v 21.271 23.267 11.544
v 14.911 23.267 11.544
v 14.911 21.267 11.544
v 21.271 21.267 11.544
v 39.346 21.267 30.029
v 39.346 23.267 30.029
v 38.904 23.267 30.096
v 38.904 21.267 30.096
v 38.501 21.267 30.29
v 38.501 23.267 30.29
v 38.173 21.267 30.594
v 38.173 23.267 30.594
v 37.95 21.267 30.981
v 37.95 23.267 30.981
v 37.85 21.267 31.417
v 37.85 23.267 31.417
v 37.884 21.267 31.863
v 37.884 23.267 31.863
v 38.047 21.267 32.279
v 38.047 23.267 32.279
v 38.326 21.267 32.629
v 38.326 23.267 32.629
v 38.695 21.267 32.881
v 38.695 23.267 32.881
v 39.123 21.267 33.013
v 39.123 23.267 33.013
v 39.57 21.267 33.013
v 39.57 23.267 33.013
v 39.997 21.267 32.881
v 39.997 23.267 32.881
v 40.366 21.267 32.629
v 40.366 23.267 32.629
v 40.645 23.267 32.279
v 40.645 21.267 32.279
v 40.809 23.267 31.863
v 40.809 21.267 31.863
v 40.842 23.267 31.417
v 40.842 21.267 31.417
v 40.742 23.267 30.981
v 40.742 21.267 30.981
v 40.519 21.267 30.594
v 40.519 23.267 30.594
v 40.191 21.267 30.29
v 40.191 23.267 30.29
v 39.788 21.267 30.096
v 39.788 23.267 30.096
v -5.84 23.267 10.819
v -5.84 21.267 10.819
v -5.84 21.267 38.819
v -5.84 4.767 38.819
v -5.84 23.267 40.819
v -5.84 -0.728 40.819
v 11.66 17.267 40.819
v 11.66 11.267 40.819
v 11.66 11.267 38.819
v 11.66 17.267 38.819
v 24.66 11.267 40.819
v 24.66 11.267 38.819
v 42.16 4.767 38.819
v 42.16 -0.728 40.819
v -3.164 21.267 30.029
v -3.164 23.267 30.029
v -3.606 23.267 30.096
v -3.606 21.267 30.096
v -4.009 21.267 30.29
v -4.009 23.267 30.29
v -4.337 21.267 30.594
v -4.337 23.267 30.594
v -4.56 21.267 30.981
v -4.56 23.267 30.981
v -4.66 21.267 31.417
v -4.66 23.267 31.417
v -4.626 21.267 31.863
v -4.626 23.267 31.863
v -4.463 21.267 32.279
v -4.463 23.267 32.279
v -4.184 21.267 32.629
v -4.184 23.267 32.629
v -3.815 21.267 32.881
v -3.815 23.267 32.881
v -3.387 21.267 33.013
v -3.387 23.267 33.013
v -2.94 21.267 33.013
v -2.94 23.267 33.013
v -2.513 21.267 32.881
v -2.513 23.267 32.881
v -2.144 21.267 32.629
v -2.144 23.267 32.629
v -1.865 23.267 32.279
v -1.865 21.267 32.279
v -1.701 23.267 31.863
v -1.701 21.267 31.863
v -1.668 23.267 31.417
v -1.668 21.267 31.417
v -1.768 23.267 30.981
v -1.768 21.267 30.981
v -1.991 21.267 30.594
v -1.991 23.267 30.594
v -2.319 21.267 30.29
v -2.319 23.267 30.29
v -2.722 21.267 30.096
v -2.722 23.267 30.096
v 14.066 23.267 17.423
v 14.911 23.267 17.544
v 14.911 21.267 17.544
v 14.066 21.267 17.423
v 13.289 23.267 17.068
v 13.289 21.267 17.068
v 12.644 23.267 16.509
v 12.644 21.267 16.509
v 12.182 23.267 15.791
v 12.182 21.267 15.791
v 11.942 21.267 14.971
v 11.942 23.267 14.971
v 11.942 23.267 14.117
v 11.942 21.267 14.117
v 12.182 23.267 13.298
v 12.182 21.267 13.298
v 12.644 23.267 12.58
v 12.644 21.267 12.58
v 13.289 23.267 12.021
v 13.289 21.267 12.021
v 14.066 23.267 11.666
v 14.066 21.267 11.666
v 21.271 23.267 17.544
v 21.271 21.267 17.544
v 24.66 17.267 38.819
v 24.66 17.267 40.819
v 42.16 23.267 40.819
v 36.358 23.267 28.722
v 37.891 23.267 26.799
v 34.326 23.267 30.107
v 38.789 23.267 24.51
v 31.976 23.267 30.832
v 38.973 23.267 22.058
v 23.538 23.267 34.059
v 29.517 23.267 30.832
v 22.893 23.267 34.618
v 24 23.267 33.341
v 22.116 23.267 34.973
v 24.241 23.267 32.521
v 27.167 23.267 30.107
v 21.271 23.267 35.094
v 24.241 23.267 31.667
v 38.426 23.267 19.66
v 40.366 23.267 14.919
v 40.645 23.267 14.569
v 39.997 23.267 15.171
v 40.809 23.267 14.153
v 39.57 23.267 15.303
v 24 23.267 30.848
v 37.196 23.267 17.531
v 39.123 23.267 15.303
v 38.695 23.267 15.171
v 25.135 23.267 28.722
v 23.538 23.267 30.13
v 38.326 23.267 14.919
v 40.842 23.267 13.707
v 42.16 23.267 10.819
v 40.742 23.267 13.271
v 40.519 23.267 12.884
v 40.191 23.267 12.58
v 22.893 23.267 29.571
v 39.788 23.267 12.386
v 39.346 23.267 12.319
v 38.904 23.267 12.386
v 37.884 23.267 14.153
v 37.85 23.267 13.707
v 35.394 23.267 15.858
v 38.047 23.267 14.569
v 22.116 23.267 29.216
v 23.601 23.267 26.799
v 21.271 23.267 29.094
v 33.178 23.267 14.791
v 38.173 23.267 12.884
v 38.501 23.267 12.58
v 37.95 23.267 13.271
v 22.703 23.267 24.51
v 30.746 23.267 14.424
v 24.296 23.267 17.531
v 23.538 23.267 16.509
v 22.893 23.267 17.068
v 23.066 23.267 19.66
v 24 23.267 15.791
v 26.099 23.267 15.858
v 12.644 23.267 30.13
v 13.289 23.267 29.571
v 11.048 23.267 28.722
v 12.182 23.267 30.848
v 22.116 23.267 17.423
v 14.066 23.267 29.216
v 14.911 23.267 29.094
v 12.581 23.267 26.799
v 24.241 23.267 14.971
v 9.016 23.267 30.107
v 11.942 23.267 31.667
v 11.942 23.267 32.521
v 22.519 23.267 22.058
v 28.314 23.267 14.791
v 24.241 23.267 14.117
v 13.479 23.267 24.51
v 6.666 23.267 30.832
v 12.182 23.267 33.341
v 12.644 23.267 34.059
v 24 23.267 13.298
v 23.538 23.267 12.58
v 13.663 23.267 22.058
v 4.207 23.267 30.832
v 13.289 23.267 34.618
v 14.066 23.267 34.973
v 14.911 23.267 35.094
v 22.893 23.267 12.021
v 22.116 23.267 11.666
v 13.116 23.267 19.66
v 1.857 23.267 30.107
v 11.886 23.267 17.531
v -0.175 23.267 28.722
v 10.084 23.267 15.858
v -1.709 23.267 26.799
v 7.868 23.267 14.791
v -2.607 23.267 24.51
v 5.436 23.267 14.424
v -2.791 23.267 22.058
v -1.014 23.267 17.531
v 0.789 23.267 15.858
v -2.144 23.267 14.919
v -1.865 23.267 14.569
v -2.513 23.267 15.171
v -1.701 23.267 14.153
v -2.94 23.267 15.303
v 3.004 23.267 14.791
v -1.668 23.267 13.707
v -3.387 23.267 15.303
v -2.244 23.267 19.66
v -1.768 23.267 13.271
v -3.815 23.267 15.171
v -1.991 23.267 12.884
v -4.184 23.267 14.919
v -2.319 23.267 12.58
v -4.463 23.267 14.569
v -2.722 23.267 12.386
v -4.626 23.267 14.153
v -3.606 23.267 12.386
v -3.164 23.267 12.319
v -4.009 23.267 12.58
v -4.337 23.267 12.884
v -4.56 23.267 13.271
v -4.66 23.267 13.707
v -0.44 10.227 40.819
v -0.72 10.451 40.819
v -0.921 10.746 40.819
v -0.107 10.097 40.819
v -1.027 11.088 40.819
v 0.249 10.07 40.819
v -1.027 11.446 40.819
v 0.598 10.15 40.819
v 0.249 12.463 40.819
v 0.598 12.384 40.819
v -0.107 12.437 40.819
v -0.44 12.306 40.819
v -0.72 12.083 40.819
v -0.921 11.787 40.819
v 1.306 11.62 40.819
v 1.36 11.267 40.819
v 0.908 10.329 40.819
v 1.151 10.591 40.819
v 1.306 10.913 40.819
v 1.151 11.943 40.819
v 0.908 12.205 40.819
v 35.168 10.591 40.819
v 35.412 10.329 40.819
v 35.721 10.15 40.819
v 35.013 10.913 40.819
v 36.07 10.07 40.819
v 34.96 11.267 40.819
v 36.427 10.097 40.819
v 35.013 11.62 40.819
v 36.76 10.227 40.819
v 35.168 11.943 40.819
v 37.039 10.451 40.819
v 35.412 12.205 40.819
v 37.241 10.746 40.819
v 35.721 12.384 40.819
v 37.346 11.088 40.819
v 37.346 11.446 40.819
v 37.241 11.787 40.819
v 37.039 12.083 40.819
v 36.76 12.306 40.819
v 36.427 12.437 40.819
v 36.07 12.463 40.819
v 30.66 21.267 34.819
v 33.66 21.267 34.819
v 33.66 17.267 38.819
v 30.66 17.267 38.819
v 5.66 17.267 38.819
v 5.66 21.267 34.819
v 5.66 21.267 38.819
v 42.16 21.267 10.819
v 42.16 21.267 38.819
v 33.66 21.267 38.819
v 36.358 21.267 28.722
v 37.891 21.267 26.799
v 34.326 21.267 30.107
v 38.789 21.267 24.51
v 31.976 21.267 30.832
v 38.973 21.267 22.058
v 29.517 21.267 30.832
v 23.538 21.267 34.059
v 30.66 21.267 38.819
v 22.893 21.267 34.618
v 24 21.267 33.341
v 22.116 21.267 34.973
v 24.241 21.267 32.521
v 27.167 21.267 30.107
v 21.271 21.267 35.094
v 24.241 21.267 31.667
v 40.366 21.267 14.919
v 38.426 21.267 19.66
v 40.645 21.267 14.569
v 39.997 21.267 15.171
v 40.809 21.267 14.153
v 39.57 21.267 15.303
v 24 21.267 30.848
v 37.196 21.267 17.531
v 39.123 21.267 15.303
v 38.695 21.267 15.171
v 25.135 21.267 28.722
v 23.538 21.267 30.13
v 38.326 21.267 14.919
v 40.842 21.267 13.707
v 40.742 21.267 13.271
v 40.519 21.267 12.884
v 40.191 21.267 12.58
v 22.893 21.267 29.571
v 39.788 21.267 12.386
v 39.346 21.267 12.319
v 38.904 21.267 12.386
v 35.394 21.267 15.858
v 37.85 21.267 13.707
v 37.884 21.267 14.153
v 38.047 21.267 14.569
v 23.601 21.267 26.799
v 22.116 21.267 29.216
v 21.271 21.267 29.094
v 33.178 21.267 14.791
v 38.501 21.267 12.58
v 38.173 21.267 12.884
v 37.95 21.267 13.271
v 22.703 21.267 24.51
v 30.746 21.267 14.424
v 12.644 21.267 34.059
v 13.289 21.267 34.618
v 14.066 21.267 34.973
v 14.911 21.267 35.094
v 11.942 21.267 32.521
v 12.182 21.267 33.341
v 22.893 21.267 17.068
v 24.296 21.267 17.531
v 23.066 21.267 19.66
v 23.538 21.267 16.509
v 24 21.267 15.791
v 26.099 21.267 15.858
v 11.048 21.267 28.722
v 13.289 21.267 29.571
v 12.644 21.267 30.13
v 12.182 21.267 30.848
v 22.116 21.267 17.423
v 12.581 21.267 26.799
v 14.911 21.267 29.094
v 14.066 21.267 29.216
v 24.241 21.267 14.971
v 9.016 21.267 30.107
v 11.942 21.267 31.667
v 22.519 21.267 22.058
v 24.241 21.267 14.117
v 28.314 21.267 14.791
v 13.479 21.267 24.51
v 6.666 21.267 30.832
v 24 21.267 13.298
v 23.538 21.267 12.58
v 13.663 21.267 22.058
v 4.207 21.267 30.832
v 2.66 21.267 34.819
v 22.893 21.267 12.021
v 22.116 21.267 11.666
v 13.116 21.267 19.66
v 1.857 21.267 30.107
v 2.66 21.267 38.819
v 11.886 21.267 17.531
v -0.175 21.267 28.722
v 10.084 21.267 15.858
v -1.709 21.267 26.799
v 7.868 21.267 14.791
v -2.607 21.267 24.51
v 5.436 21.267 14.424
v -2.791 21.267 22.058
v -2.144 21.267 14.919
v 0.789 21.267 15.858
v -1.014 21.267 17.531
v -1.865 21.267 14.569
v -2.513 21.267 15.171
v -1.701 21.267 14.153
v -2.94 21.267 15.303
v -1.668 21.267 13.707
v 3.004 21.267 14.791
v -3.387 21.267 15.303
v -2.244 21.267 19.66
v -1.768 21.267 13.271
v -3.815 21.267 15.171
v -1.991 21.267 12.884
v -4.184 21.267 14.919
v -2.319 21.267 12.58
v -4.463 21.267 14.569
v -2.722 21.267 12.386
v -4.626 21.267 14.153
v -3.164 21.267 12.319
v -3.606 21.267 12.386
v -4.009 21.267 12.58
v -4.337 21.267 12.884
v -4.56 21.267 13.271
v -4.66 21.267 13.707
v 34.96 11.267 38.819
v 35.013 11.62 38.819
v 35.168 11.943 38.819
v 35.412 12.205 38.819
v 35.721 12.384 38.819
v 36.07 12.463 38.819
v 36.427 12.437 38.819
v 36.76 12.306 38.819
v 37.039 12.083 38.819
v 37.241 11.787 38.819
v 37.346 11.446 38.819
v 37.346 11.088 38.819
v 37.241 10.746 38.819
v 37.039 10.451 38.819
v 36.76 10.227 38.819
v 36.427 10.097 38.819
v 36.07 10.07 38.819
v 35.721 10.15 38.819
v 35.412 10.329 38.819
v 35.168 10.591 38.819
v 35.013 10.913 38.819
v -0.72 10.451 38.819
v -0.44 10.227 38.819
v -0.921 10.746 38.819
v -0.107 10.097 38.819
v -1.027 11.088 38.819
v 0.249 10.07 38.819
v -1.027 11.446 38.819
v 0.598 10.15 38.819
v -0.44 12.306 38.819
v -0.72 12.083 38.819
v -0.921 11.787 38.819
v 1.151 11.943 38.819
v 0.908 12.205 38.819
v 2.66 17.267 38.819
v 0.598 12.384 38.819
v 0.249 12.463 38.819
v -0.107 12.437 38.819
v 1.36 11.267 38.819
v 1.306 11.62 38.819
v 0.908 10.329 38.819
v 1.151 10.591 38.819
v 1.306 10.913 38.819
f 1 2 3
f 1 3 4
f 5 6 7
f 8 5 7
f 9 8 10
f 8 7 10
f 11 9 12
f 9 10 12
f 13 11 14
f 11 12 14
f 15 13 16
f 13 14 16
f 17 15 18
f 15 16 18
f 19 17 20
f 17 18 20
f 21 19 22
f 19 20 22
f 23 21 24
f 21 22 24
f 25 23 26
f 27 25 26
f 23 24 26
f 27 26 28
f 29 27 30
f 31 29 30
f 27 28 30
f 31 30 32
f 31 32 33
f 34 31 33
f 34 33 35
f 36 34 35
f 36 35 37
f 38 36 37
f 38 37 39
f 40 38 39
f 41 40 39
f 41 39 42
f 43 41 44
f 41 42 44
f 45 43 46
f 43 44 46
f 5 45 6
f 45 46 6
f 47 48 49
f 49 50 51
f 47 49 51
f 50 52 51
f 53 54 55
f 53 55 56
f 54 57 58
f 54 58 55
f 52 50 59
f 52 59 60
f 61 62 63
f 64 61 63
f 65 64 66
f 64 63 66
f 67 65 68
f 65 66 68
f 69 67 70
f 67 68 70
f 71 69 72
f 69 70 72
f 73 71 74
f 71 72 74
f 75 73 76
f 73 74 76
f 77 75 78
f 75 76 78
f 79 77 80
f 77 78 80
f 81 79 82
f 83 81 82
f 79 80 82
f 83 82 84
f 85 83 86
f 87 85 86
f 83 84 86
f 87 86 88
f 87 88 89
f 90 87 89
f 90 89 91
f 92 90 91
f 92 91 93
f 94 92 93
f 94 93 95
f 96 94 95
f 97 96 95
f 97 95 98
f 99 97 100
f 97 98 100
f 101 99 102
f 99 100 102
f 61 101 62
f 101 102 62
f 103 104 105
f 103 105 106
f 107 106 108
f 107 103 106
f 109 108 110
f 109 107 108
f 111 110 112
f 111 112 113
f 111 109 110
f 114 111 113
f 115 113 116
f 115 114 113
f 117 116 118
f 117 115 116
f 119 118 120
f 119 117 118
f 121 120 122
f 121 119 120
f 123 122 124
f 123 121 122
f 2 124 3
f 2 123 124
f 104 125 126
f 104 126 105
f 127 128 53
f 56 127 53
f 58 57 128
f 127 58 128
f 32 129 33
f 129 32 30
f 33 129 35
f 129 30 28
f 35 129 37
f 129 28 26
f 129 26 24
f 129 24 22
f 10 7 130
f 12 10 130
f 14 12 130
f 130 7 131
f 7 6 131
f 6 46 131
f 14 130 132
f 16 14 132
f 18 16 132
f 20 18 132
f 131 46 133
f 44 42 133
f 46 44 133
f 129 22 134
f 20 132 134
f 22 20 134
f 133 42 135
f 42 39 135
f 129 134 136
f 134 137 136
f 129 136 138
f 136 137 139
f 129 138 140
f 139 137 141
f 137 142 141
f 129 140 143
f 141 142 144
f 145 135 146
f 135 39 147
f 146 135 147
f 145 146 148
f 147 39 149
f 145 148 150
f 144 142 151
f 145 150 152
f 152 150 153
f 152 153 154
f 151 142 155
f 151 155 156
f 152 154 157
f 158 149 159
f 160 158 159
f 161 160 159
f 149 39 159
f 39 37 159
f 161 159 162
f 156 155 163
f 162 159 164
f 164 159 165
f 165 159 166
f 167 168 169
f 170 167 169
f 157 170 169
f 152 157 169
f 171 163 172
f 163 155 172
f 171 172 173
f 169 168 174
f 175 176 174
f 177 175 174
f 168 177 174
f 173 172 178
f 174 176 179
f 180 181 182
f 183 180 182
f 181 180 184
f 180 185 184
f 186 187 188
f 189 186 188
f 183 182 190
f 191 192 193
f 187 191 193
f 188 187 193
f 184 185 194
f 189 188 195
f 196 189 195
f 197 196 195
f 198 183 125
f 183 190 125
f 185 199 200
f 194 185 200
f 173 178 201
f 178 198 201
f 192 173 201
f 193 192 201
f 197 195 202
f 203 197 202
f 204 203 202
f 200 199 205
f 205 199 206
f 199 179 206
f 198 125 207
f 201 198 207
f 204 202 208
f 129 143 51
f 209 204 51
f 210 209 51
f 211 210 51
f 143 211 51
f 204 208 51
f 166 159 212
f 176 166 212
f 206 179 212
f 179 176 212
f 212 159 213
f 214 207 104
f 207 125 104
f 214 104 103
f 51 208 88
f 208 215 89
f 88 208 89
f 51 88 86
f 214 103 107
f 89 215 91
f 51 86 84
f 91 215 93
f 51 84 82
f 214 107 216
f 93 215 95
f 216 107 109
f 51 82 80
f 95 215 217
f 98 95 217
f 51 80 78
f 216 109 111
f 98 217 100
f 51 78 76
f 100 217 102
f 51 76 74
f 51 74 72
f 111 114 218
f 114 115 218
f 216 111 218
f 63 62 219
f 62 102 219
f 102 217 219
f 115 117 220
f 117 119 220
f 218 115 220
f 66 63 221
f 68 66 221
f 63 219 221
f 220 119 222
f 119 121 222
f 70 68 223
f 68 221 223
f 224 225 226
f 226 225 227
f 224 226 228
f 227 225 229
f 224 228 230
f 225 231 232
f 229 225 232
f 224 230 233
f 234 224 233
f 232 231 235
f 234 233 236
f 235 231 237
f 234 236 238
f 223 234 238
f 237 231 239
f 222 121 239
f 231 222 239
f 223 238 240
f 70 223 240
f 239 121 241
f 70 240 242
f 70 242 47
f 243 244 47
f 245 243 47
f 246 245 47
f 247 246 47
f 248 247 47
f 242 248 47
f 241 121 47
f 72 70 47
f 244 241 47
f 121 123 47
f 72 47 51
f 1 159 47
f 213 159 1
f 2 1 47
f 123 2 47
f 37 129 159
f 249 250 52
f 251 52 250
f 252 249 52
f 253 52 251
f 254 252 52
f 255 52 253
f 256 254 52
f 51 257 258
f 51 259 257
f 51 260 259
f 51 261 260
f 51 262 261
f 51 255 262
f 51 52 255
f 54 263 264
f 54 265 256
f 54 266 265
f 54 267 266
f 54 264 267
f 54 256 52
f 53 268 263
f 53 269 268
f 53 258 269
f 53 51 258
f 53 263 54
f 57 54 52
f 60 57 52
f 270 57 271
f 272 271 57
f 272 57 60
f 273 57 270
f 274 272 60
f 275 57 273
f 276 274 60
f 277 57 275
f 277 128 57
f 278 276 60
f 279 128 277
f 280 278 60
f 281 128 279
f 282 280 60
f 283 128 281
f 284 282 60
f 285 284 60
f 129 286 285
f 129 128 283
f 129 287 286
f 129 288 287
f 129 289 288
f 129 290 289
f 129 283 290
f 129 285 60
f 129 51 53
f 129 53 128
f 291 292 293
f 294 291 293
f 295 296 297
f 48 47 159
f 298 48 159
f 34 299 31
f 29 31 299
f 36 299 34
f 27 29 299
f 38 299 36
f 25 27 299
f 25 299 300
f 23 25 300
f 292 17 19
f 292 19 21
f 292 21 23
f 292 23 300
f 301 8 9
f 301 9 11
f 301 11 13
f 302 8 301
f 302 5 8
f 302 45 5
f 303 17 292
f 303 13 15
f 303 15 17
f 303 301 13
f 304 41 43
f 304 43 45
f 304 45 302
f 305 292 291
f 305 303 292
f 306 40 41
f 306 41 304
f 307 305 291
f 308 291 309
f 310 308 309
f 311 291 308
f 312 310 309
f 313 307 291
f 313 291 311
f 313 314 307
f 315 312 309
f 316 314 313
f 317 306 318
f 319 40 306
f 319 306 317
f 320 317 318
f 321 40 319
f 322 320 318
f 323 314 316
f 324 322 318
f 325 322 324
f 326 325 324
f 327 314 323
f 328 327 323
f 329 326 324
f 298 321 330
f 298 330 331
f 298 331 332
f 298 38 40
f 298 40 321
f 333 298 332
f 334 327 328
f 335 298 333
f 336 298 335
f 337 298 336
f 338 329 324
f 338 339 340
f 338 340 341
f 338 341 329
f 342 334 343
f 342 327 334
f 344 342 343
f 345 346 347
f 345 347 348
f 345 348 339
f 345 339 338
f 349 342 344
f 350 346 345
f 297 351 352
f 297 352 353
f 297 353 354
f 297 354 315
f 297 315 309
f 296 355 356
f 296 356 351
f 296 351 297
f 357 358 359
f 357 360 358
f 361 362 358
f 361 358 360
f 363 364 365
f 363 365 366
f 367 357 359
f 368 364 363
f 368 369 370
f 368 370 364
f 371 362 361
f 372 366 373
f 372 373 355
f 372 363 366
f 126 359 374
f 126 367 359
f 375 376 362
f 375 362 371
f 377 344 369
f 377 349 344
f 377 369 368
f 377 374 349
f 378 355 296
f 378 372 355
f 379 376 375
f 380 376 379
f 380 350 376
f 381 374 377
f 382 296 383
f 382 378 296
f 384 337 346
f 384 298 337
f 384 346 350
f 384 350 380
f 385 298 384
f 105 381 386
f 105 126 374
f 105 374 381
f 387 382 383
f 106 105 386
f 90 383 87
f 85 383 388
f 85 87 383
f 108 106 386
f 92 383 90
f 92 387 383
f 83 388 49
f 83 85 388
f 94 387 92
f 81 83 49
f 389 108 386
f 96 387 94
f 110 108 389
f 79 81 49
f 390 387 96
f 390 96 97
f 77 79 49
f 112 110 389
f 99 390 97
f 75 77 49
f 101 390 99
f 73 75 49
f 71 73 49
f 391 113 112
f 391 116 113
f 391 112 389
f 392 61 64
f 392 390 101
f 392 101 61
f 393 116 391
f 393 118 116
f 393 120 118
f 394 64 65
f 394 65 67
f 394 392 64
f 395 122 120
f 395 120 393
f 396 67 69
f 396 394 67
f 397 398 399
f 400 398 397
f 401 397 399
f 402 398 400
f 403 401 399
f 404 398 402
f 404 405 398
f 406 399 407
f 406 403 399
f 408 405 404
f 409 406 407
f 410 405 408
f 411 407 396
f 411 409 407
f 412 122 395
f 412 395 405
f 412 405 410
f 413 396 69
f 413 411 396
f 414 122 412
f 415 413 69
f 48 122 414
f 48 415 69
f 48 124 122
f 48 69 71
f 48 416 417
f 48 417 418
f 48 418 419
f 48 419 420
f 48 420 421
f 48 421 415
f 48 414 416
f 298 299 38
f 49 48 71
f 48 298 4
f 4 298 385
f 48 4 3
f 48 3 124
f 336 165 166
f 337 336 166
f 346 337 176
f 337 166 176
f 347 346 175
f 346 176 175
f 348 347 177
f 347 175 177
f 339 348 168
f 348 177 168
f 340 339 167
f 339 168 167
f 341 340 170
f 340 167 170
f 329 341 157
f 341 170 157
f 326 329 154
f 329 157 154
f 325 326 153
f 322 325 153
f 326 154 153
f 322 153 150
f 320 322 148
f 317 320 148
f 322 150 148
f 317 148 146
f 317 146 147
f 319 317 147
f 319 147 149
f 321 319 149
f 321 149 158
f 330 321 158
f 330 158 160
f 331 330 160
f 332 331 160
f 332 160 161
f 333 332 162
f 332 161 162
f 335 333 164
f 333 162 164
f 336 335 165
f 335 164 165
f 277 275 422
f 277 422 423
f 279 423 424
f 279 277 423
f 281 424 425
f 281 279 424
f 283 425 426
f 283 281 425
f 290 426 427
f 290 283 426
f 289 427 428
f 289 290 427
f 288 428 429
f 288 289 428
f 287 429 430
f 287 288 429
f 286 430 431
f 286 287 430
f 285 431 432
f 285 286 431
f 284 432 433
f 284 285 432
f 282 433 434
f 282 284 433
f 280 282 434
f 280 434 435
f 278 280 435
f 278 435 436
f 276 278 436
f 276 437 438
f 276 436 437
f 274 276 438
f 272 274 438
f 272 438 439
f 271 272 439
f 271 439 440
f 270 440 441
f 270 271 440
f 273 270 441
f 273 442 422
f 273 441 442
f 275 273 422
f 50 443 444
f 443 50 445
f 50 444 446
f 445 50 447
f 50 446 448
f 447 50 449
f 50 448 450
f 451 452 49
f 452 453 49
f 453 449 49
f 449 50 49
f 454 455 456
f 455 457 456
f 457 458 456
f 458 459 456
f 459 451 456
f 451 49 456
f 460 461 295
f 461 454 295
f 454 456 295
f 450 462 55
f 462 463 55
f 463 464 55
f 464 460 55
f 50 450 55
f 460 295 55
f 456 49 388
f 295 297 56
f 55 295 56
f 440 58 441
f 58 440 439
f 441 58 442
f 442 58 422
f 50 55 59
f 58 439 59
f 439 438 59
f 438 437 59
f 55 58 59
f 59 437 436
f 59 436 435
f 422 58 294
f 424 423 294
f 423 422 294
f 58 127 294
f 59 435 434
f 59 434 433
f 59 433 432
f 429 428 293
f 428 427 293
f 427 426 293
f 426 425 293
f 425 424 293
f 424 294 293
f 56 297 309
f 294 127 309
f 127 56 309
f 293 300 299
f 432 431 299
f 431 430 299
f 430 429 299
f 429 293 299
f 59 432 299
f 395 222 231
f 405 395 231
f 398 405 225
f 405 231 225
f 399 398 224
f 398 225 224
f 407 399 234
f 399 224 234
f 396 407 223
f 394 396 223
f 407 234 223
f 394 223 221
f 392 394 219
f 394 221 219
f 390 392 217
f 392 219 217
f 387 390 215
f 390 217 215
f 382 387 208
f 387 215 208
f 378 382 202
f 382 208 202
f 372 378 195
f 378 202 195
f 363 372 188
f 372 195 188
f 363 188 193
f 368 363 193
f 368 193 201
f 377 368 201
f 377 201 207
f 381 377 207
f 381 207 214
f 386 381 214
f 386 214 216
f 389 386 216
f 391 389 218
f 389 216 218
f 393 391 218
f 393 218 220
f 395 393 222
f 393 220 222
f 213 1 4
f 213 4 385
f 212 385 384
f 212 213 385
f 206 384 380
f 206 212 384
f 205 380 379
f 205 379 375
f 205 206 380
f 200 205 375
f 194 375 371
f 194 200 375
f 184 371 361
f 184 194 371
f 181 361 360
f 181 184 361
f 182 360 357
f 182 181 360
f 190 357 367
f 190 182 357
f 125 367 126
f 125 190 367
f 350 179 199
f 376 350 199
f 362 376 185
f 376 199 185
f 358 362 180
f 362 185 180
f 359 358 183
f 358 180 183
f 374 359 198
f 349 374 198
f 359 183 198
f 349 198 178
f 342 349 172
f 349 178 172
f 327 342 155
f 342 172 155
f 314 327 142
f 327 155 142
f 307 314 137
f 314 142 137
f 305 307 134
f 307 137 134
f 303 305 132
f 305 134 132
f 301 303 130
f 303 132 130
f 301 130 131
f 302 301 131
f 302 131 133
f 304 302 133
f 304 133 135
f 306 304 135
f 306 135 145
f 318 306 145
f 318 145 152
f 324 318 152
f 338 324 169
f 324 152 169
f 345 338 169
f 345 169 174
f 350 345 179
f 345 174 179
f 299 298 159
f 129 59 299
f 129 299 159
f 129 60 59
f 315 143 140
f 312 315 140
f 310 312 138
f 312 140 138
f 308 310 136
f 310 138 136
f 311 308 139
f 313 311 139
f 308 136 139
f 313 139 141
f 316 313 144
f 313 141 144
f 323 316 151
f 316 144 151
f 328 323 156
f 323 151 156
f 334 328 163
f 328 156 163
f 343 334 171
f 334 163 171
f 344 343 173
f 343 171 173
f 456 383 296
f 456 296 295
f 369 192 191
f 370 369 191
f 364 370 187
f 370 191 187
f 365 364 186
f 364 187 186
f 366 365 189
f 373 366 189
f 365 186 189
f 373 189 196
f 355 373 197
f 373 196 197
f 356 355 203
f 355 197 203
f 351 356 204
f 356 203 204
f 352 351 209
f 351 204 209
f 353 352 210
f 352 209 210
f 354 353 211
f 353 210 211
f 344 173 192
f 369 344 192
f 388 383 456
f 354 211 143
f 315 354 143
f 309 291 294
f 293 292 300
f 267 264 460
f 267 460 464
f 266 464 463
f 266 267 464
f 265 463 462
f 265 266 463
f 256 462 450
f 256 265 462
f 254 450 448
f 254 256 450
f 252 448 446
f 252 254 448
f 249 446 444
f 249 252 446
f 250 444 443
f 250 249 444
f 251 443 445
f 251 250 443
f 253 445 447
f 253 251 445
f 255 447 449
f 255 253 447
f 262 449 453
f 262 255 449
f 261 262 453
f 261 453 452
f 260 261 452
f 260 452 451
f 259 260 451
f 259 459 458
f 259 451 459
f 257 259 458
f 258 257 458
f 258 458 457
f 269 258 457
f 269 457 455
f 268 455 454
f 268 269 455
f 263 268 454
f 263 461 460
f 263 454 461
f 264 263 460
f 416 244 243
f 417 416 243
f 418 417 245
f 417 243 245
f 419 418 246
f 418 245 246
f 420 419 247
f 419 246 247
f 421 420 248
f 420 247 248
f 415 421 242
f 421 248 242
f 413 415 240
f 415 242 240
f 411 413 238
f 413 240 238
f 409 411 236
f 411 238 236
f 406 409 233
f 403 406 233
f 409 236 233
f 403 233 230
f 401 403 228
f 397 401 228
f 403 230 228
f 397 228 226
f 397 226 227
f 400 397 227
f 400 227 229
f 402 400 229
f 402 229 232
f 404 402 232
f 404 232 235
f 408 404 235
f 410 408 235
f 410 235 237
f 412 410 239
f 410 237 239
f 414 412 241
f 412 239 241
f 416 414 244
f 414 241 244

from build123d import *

# Parameters (mm, degrees)
SKIZZE1_W                            = 48
SKIZZE1_H                            = 25
SKIZZE1_R                            = 8.25
SKIZZE1_R_2                          = 1.5
AUFSATZ_LINEAR_AUSTRAGEN1_DEPTH      = 2
SKIZZE2_W                            = 48
SKIZZE2_H                            = 5
AUFSATZ_LINEAR_AUSTRAGEN2_DEPTH      = 2
SKIZZE3_W                            = 48
SKIZZE3_H                            = 22
AUFSATZ_LINEAR_AUSTRAGEN3_DEPTH      = 2
AUFSATZ_LINEAR_AUSTRAGEN4_DEPTH      = 1.5
SCHNITT_LINEAR_AUSTRAGEN1_DEPTH      = 56.702642494
SCHNITT_LINEAR_AUSTRAGEN1_DEPTH_BACK = 56.702642494
SKIZZE6_W                            = 13
SKIZZE6_H                            = 6
SCHNITT_LINEAR_AUSTRAGEN2_DEPTH      = 56.702642494
SCHNITT_LINEAR_AUSTRAGEN2_DEPTH_BACK = 56.702642494
SKIZZE7_R                            = 1.2
FASE1_SIZE                           = 5.5
FASE1_SIZE_2                         = 2.001836288


with BuildPart() as part:
    # Skizze1 → Aufsatz-Linear austragen1 (new body)
    with BuildSketch(Plane(origin=(0, 23.26672716, 0), x_dir=(1, 0, 0), z_dir=(0, 1, 0))):
        with Locations((18.159741318, -23.319374593)):
            Rectangle(SKIZZE1_W, SKIZZE1_H)
        with Locations(Location((5.436155106, -22.674374593, 0), (0, 0, 90))):
            Circle(SKIZZE1_R, mode=Mode.SUBTRACT)
        with Locations(Location((30.746155106, -22.674374593, 0), (0, 0, 90))):
            Circle(SKIZZE1_R, mode=Mode.SUBTRACT)
        with Locations(Location((39.346155106, -31.529374593, 0), (0, 0, 90))):
            Circle(SKIZZE1_R_2, mode=Mode.SUBTRACT)
        with Locations(Location((39.346155106, -13.819374593, 0), (0, 0, 90))):
            Circle(SKIZZE1_R_2, mode=Mode.SUBTRACT)
        with Locations(Location((-3.163844894, -13.819374593, 0), (0, 0, 90))):
            Circle(SKIZZE1_R_2, mode=Mode.SUBTRACT)
        with Locations(Location((-3.163844894, -31.529374593, 0), (0, 0, 90))):
            Circle(SKIZZE1_R_2, mode=Mode.SUBTRACT)
        with BuildLine():
            Line((21.271155106, -29.094374598), (14.911155106, -29.094374598))
            ThreePointArc((14.911155106, -29.094374598), (11.911155106, -32.094374598), (14.911155106, -35.094374598))
            Line((14.911155106, -35.094374598), (21.271155106, -35.094374598))
            ThreePointArc((21.271155106, -35.094374598), (24.271155106, -32.094374598), (21.271155106, -29.094374598))
        make_face(mode=Mode.SUBTRACT)
        with BuildLine():
            Line((14.911155106, -11.544374589), (21.271155106, -11.544374589))
            ThreePointArc((21.271155106, -11.544374589), (24.271155106, -14.544374589), (21.271155106, -17.544374589))
            Line((21.271155106, -17.544374589), (14.911155106, -17.544374589))
            ThreePointArc((14.911155106, -17.544374589), (11.911155106, -14.544374589), (14.911155106, -11.544374589))
        make_face(mode=Mode.SUBTRACT)
    extrude(amount=-AUFSATZ_LINEAR_AUSTRAGEN1_DEPTH)

    # Skizze2 → Aufsatz-Linear austragen2 (add)
    with BuildSketch(Plane(origin=(0, 21.26672716, 0), x_dir=(-1, 0, 0), z_dir=(0, -1, 0))):
        with Locations((-18.159741318, -38.319374593)):
            Rectangle(SKIZZE2_W, SKIZZE2_H)
    extrude(amount=-AUFSATZ_LINEAR_AUSTRAGEN2_DEPTH)

    # Skizze3 → Aufsatz-Linear austragen3 (add)
    with BuildSketch(Plane.XY.offset(40.819374593)):
        with Locations((18.159741318, 10.26672716)):
            Rectangle(SKIZZE3_W, SKIZZE3_H)
    extrude(amount=-AUFSATZ_LINEAR_AUSTRAGEN3_DEPTH)

    # Skizze5 → Aufsatz-Linear austragen4 (add, symmetric)
    with BuildSketch(Plane(origin=(32.159741318, 0, 0), x_dir=(0, 0, -1), z_dir=(1, 0, 0))):
        Polygon((-38.819374593, 17.26672716), (-38.819374593, 21.26672716), (-34.819374593, 21.26672716), align=None)
    aufsatz_linear_austragen4 = extrude(amount=AUFSATZ_LINEAR_AUSTRAGEN4_DEPTH, both=True)

    # Spiegeln1: Aufsatz-Linear austragen4 across plane
    add(aufsatz_linear_austragen4.mirror(Plane(origin=(18.159741318, 0, 0), x_dir=(0, 0, 1), z_dir=(1, 0, 0))))

    # Skizze6 → Schnitt-Linear austragen1 (cut, two sides: drawn at the far end of the back side and taken through both)
    with BuildSketch(Plane(origin=(0, 0, 38.819374593), x_dir=(-1, 0, 0), z_dir=(0, 0, -1)).offset(-SCHNITT_LINEAR_AUSTRAGEN1_DEPTH_BACK)):
        with Locations((-18.159741318, 14.26672716)):
            Rectangle(SKIZZE6_W, SKIZZE6_H)
    extrude(amount=SCHNITT_LINEAR_AUSTRAGEN1_DEPTH + SCHNITT_LINEAR_AUSTRAGEN1_DEPTH_BACK, mode=Mode.SUBTRACT)

    # Skizze7 → Schnitt-Linear austragen2 (cut, two sides: drawn at the far end of the back side and taken through both)
    with BuildSketch(Plane(origin=(0, 0, 38.819374593), x_dir=(-1, 0, 0), z_dir=(0, 0, -1)).offset(-SCHNITT_LINEAR_AUSTRAGEN2_DEPTH_BACK)):
        with Locations((-36.159741318, 11.26672716)):
            Circle(SKIZZE7_R)
        with Locations(Location((-0.159741318, 11.26672716, 0), (0, 0, 180))):
            Circle(SKIZZE7_R)
    extrude(amount=SCHNITT_LINEAR_AUSTRAGEN2_DEPTH + SCHNITT_LINEAR_AUSTRAGEN2_DEPTH_BACK, mode=Mode.SUBTRACT)

    # Fase1
    # the kernel refuses this chamfer: 5.5, 2.001836288 mm, written as the material it takes off along each edge
    with BuildSketch(Plane(origin=(-20.108329711, -0.73327284, 38.819374593), x_dir=(0, 0.9999130865277315, -0.013184058198645307), z_dir=(1, 0, 0))) as fase1_piece_1:
        Polygon((FASE1_SIZE * 0.999913086528, FASE1_SIZE * 0.0131840581986), (-FASE1_SIZE_2 * 0.0131840582017, FASE1_SIZE_2 * 0.99991308676), (0, 0), align=None)
    extrude(amount=76.536142058, mode=Mode.SUBTRACT)


solid = part.part
